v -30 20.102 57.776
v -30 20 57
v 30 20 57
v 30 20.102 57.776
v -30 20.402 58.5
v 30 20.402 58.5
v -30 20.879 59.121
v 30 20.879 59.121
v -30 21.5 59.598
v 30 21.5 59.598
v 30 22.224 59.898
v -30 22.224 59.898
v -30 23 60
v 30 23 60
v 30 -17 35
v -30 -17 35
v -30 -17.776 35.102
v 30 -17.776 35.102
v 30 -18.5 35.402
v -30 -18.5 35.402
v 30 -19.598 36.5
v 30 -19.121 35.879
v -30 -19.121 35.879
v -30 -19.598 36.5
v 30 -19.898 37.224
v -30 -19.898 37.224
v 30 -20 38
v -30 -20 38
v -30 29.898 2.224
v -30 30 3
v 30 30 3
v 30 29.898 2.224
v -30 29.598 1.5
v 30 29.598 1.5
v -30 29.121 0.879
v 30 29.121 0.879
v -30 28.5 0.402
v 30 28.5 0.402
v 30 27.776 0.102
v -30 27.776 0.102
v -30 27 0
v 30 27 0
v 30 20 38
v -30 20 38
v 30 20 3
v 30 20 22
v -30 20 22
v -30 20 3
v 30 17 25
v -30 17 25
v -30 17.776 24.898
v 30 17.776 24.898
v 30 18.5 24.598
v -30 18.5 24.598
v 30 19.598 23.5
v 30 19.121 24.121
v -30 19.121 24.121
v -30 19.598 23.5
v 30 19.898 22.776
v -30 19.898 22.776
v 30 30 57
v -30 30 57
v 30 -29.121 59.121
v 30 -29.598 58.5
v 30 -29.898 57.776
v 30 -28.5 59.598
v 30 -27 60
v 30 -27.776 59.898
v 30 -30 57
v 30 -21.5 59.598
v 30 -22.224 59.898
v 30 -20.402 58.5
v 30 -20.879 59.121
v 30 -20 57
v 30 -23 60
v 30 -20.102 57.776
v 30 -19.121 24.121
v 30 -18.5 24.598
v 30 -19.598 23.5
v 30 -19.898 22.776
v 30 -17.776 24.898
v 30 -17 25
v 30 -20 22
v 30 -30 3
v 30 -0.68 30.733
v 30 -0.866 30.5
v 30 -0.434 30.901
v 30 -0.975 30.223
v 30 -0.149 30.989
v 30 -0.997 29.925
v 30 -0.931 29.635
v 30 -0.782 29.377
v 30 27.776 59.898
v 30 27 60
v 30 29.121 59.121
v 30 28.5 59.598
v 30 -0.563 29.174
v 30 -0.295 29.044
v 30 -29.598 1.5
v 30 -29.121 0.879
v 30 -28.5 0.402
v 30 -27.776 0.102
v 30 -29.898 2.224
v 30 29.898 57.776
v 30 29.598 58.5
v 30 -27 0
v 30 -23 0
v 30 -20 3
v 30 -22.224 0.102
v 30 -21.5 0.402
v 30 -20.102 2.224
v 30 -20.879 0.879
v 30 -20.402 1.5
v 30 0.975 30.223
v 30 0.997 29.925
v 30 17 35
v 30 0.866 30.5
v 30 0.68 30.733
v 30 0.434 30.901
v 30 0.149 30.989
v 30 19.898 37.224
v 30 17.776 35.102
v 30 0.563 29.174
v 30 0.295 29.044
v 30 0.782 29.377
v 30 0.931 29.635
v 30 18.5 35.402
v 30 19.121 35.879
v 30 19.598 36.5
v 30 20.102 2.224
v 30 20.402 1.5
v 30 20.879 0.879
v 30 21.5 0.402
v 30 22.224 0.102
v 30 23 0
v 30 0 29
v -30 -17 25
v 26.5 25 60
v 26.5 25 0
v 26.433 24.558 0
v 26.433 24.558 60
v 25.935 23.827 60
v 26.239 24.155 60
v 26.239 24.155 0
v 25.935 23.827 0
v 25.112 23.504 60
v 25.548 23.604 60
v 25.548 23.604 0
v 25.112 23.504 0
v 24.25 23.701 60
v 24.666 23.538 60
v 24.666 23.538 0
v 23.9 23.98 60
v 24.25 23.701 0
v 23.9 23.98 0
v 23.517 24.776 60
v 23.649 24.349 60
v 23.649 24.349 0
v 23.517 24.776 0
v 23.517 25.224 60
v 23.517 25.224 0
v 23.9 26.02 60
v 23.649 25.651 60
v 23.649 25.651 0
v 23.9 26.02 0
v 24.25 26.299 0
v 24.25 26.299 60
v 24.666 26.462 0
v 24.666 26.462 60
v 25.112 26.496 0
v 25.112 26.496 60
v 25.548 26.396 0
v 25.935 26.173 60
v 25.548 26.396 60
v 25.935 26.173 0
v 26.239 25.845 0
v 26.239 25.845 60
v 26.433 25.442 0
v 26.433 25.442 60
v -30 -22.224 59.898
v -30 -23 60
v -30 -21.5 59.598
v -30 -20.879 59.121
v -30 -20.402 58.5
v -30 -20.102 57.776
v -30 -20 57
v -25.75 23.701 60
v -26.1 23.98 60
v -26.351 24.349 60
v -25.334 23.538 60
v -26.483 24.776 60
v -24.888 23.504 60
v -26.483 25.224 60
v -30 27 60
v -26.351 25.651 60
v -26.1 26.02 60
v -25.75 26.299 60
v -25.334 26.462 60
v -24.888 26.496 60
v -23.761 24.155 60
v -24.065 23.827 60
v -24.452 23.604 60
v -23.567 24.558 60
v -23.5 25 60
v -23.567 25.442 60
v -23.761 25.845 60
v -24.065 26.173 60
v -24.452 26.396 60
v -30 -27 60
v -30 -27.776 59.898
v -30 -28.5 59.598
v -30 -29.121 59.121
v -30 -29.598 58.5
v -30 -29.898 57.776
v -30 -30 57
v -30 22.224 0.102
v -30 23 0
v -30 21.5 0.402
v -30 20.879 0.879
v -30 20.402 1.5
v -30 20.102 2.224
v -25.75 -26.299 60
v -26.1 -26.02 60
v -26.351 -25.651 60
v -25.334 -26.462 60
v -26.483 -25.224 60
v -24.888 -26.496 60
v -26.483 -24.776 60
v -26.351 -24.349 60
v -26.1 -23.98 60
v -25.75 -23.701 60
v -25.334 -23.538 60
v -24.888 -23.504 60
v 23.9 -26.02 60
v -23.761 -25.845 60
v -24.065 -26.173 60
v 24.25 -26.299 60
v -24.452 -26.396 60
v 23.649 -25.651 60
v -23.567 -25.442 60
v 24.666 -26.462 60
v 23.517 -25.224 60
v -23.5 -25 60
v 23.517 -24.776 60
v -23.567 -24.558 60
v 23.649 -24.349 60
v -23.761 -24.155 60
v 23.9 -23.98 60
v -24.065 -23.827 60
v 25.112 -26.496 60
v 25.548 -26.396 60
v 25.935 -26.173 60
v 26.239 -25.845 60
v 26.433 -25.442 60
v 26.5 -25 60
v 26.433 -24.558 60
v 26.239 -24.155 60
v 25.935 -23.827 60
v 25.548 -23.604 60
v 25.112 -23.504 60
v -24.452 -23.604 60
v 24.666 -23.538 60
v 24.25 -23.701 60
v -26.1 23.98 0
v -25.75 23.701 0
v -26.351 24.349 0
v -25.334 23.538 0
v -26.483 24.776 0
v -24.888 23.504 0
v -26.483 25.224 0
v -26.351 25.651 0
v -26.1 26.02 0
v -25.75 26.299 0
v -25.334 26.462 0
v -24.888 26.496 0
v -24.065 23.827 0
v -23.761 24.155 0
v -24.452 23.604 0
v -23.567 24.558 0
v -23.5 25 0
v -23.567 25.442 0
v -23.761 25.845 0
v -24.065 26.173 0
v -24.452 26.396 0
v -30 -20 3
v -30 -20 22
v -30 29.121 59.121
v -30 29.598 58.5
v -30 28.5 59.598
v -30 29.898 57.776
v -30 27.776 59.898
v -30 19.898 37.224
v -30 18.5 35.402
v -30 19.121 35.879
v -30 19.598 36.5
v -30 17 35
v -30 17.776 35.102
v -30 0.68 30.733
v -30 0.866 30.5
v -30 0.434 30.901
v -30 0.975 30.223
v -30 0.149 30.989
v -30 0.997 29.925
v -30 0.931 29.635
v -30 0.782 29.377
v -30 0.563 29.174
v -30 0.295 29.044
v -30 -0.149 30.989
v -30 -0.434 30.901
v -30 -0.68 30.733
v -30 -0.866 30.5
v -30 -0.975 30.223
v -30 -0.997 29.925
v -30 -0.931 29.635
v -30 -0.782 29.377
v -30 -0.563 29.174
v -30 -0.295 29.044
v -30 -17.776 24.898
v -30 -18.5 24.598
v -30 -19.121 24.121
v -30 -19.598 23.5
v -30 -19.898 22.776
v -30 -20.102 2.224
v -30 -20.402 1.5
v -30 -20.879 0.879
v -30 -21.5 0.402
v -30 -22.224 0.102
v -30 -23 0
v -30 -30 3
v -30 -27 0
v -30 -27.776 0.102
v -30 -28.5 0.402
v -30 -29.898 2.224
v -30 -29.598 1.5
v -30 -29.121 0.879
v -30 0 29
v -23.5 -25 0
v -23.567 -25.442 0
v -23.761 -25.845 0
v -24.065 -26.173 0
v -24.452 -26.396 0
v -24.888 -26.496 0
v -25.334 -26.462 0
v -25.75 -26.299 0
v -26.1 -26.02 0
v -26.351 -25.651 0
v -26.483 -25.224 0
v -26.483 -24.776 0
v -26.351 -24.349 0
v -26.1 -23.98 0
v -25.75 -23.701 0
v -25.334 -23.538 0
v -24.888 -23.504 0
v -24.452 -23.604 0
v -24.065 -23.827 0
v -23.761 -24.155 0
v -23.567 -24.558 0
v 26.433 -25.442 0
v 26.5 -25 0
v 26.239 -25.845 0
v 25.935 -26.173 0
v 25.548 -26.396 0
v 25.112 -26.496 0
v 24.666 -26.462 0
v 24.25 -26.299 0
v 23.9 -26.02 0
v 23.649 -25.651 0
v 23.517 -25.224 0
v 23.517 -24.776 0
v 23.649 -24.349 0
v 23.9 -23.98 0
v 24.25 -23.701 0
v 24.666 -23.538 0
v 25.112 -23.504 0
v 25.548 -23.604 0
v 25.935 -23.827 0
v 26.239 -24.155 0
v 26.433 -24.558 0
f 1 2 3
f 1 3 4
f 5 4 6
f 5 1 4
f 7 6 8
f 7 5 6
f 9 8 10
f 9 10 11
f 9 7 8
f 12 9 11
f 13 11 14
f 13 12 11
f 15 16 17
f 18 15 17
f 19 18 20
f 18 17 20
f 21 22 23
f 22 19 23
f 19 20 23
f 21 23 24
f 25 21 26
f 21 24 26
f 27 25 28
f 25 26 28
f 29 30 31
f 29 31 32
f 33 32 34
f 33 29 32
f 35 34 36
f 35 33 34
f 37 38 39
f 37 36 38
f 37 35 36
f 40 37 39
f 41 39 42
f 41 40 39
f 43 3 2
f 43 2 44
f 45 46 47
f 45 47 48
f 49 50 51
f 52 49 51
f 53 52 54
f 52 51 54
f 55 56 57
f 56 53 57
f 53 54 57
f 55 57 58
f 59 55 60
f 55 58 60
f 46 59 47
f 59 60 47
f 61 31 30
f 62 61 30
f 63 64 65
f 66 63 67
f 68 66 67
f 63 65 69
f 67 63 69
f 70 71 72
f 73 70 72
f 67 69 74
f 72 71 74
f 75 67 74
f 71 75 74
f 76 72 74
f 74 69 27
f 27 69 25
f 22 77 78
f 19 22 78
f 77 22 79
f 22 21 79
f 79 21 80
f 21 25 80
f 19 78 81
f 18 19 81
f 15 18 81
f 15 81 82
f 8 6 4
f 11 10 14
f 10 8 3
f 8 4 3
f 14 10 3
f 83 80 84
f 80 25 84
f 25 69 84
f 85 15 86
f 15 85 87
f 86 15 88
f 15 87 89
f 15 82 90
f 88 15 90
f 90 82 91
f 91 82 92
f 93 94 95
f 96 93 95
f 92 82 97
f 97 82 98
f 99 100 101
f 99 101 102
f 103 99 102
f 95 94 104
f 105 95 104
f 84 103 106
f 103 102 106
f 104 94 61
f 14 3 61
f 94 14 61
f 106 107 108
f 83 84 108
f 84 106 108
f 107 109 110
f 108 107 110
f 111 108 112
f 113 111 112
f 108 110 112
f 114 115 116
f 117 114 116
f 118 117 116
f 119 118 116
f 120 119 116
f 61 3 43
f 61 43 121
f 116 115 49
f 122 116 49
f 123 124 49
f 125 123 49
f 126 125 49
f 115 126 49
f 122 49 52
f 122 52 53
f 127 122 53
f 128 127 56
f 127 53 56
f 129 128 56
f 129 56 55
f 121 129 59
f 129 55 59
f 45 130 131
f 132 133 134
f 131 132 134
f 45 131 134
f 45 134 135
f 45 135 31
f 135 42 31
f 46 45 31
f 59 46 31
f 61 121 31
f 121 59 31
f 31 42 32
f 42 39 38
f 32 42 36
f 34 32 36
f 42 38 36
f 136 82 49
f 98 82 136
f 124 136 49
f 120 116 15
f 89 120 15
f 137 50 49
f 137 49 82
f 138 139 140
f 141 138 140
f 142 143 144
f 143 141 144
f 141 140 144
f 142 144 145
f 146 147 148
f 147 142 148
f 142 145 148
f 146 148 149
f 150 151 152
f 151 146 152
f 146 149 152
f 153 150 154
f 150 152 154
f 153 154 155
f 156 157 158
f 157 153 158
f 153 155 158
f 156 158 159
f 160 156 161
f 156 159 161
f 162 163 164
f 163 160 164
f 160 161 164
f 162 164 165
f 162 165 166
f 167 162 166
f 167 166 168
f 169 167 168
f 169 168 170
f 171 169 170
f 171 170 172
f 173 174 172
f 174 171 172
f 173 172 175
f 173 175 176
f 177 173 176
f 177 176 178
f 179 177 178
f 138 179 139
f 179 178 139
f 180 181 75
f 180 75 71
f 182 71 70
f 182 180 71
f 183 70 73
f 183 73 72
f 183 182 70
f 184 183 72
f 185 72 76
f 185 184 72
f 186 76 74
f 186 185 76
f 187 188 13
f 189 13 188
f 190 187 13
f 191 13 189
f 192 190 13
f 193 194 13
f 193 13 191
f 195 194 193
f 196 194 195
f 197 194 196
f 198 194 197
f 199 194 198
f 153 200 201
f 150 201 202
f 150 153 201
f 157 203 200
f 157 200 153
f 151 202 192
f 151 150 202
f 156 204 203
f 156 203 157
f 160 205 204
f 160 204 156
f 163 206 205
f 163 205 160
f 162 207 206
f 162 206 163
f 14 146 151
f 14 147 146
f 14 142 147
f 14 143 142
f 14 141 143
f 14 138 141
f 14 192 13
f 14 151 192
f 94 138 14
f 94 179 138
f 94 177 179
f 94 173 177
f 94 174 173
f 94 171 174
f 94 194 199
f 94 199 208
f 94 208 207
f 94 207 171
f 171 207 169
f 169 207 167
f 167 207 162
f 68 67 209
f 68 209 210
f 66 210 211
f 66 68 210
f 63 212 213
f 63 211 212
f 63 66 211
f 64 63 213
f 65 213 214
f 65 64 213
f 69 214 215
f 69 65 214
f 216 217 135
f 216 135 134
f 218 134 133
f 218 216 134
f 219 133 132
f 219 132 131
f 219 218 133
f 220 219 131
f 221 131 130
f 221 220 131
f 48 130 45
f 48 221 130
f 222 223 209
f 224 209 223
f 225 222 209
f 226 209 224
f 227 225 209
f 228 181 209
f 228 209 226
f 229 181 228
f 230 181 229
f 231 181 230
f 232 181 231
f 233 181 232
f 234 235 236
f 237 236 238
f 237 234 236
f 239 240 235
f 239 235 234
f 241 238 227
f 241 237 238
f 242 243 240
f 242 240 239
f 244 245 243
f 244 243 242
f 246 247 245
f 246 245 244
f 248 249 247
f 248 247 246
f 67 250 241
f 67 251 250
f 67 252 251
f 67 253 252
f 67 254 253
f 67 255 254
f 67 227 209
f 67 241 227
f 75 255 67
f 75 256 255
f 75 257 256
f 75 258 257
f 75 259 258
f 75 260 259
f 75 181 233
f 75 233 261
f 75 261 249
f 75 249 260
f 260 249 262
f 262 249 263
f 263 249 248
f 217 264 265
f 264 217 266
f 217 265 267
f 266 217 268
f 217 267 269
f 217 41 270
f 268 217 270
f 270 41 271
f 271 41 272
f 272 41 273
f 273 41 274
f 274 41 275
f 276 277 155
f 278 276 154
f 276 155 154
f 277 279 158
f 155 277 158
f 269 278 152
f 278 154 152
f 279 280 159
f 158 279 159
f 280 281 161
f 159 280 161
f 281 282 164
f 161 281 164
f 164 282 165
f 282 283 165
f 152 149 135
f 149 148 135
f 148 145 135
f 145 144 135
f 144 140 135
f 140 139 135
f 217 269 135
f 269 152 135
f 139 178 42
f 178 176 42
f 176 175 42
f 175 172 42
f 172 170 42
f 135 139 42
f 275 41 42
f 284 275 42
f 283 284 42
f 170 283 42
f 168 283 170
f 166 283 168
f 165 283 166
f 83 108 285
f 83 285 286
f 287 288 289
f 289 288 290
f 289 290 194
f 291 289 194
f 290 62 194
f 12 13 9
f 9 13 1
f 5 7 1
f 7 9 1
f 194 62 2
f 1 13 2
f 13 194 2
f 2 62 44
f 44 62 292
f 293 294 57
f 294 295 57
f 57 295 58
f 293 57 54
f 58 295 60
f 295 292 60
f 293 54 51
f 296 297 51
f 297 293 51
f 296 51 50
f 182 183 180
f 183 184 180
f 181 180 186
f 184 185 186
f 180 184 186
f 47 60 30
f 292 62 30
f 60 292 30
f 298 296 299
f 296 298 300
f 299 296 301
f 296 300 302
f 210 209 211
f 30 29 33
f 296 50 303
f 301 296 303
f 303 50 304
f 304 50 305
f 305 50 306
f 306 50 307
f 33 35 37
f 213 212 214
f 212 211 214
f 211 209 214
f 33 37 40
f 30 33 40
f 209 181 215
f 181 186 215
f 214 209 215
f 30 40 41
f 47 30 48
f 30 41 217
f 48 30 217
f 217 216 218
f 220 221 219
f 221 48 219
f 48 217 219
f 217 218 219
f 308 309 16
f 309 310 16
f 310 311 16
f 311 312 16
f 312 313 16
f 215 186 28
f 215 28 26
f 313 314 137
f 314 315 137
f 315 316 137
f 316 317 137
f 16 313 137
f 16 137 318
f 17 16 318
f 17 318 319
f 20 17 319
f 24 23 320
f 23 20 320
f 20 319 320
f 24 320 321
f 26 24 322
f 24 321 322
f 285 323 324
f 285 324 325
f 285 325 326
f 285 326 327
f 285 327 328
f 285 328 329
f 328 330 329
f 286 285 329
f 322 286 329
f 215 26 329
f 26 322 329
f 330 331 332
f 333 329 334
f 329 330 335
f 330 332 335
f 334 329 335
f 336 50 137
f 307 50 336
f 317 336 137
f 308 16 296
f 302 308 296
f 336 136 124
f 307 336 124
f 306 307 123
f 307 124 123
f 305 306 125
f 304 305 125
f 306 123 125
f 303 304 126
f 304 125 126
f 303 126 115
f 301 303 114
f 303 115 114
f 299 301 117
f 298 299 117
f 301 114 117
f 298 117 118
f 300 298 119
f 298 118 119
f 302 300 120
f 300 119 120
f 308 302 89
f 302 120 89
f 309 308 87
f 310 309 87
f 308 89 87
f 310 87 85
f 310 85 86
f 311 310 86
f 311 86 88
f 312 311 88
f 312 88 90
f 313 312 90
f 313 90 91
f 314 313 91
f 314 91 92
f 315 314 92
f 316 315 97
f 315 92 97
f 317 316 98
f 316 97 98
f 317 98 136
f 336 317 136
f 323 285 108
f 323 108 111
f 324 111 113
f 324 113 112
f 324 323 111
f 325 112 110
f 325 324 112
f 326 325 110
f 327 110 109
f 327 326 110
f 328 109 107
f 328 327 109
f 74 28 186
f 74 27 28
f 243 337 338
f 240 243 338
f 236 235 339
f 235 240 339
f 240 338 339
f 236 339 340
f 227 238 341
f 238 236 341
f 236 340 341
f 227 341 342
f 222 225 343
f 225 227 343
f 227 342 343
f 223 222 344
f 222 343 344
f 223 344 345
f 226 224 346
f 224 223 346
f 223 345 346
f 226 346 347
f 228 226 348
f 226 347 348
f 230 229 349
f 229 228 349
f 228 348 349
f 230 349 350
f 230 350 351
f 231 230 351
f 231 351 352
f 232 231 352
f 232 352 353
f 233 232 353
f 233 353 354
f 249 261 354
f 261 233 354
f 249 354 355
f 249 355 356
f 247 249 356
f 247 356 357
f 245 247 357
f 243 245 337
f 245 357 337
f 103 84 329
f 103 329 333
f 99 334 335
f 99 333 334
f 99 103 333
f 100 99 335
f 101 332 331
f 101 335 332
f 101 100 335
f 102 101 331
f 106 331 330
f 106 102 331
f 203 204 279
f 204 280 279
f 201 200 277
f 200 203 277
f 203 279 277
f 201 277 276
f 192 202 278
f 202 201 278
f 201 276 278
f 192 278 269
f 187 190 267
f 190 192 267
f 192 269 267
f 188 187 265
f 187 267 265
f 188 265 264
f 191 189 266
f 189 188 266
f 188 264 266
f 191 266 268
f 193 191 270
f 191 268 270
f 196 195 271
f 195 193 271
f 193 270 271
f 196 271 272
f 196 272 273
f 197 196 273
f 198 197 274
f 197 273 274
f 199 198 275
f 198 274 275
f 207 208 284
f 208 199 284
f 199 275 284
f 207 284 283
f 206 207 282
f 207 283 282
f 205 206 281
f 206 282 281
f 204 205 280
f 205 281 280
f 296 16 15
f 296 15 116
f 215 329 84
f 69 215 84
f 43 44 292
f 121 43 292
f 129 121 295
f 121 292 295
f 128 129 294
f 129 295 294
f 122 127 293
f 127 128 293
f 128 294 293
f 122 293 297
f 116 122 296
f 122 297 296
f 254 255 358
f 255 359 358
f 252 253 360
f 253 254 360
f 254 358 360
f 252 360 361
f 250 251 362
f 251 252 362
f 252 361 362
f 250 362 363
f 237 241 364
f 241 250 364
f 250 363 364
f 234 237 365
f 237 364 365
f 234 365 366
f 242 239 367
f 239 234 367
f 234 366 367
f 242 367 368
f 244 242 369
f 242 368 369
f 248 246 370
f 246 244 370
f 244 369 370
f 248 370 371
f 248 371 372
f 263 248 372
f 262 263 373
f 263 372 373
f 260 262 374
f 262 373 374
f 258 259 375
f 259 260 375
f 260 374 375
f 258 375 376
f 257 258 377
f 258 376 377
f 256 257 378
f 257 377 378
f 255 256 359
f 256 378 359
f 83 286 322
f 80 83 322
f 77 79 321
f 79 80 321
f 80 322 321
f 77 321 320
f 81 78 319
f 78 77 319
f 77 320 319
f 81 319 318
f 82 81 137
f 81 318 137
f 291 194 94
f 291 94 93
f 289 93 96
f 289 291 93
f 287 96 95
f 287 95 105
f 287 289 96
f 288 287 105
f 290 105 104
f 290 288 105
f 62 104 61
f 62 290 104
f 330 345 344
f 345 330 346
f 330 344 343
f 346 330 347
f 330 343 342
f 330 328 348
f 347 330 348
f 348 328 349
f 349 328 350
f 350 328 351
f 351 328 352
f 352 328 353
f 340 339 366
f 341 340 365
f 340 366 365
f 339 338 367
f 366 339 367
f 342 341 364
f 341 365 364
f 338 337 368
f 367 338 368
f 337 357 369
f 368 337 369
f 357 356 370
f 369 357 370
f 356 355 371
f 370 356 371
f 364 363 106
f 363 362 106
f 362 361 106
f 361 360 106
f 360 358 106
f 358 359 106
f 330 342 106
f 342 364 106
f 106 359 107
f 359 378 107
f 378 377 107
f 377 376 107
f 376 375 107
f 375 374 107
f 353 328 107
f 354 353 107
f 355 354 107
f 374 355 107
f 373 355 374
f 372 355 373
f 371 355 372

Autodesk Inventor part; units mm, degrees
ref_plane "YZ Plane" through (0, 0, 0) normal (1, 0, 0) x (0, 1, 0)
ref_plane "XZ Plane" through (0, 0, 0) normal (0, 1, 0) x (-1, 0, 0)
ref_plane "XY Plane" through (0, 0, 0) normal (0, 0, 1) x (1, 0, 0)
sketch "Sketch1" plane through (0, 0, 0) normal (0, 0, 1) x (1, 0, 0)
  line L0 (-30, -30) -> (30, -30)
  line L1 (30, -30) -> (30, 30)
  line L2 (30, 30) -> (-30, 30)
  line L3 (-30, 30) -> (-30, -30)
  line L4 (-30, -30) -> (30, 30) construction
  line L5 (30, -30) -> (-30, 30) construction
  line L6 (30, 30) -> (25, 30) construction
  line L7 (25, 30) -> (25, 25) construction
  line L8 (-30, 30) -> (-25, 30) construction
  line L9 (-25, 30) -> (-25, 25) construction
  line L10 (-30, -30) -> (-30, -25) construction
  line L11 (-30, -25) -> (-25, -25) construction
  line L12 (30, -30) -> (30, -25) construction
  line L13 (30, -25) -> (25, -25) construction
  circle A0 centre (-25, 25) radius 1.5
  circle A1 centre (25, 25) radius 1.5
  circle A2 centre (25, -25) radius 1.5
  circle A3 centre (-25, -25) radius 1.5
  point P0 (0, 0)
  dimension "d0" = 60
  dimension "d1" = 60
  dimension "d2" = 5
  dimension "d3" = 5
  dimension "d4" = 5
  dimension "d5" = 5
  dimension "d6" = 5
  dimension "d7" = 5
  dimension "d8" = 5
  dimension "d9" = 5
  dimension "d10" = 3
  dimension "d11" = 3
  dimension "d12" = 3
  dimension "d13" = 3
extrude "Block" add sketch "Sketch1" along normal blind 60
sketch "Sketch2" plane through (30, -30, 0) normal (1, 0, 0) x (0, 0, -1)
  line L0 (0, 0) -> (0, 60) construction
  line L1 (-60, 0) -> (0, 60) construction
  circle A0 centre (-30, 30) radius 1
  point P0 (0, 30)
  dimension "d17" = 2
extrude "Motor Mount" cut sketch "Sketch2" against normal blind 60
sketch "Sketch3" plane through (30, -30, 0) normal (1, 0, 0) x (0, 0, -1)
  line L0 (0, 60) -> (-60, 60) construction
  line L1 (-60, 60) -> (-60, 50) construction
  line L2 (-60, 60) -> (-60, 0) construction
  line L3 (-60, 50) -> (0, 50) construction
  line L4 (0, 60) -> (0, 0) construction
  line L5 (-60, 0) -> (-60, 10) construction
  line L6 (-60, 10) -> (0, 10) construction
  circle A0 centre (-30, 30) radius 1 construction
  line L7 (-30, 30) -> (-25, 30) construction
  line L8 (-30, 30) -> (-35, 30) construction
  line L9 (-35, 30) -> (-35, 10) construction
  line L10 (-25, 30) -> (-25, 10) construction
  line L11 (-25, 30) -> (-25, 50) construction
  line L12 (-35, 30) -> (-35, 50) construction
  line L13 (-60, 50) -> (-35, 50)
  line L14 (-35, 10) -> (-60, 10)
  line L15 (-35, 10) -> (-35, 50)
  line L16 (-25, 50) -> (-25, 10)
  line L17 (0, 10) -> (-25, 10)
  line L18 (-25, 50) -> (0, 50)
  line L19 (0, 50) -> (0, 10)
  line L20 (-60, 10) -> (-60, 50)
  point P0 (0, 30)
  dimension "d20" = 10
  dimension "d21" = 10
  dimension "d22" = 5
  dimension "d23" = 5
extrude "Plastic Savings" cut sketch "Sketch3" against normal blind 60
fillet "Fillets FTW" radius 3 12 edges at (0, -30, 60) (0, -20, 60) (0, 30, 60) (0, 20, 60) (0, 20, 35) (0, -20, 35) (0, -20, 0) (0, -30, 0) (0, -20, 25) (0, 20, 25) (0, 30, 0) (0, 20, 0)
properties part number "60x60IdlerNoMotor"
